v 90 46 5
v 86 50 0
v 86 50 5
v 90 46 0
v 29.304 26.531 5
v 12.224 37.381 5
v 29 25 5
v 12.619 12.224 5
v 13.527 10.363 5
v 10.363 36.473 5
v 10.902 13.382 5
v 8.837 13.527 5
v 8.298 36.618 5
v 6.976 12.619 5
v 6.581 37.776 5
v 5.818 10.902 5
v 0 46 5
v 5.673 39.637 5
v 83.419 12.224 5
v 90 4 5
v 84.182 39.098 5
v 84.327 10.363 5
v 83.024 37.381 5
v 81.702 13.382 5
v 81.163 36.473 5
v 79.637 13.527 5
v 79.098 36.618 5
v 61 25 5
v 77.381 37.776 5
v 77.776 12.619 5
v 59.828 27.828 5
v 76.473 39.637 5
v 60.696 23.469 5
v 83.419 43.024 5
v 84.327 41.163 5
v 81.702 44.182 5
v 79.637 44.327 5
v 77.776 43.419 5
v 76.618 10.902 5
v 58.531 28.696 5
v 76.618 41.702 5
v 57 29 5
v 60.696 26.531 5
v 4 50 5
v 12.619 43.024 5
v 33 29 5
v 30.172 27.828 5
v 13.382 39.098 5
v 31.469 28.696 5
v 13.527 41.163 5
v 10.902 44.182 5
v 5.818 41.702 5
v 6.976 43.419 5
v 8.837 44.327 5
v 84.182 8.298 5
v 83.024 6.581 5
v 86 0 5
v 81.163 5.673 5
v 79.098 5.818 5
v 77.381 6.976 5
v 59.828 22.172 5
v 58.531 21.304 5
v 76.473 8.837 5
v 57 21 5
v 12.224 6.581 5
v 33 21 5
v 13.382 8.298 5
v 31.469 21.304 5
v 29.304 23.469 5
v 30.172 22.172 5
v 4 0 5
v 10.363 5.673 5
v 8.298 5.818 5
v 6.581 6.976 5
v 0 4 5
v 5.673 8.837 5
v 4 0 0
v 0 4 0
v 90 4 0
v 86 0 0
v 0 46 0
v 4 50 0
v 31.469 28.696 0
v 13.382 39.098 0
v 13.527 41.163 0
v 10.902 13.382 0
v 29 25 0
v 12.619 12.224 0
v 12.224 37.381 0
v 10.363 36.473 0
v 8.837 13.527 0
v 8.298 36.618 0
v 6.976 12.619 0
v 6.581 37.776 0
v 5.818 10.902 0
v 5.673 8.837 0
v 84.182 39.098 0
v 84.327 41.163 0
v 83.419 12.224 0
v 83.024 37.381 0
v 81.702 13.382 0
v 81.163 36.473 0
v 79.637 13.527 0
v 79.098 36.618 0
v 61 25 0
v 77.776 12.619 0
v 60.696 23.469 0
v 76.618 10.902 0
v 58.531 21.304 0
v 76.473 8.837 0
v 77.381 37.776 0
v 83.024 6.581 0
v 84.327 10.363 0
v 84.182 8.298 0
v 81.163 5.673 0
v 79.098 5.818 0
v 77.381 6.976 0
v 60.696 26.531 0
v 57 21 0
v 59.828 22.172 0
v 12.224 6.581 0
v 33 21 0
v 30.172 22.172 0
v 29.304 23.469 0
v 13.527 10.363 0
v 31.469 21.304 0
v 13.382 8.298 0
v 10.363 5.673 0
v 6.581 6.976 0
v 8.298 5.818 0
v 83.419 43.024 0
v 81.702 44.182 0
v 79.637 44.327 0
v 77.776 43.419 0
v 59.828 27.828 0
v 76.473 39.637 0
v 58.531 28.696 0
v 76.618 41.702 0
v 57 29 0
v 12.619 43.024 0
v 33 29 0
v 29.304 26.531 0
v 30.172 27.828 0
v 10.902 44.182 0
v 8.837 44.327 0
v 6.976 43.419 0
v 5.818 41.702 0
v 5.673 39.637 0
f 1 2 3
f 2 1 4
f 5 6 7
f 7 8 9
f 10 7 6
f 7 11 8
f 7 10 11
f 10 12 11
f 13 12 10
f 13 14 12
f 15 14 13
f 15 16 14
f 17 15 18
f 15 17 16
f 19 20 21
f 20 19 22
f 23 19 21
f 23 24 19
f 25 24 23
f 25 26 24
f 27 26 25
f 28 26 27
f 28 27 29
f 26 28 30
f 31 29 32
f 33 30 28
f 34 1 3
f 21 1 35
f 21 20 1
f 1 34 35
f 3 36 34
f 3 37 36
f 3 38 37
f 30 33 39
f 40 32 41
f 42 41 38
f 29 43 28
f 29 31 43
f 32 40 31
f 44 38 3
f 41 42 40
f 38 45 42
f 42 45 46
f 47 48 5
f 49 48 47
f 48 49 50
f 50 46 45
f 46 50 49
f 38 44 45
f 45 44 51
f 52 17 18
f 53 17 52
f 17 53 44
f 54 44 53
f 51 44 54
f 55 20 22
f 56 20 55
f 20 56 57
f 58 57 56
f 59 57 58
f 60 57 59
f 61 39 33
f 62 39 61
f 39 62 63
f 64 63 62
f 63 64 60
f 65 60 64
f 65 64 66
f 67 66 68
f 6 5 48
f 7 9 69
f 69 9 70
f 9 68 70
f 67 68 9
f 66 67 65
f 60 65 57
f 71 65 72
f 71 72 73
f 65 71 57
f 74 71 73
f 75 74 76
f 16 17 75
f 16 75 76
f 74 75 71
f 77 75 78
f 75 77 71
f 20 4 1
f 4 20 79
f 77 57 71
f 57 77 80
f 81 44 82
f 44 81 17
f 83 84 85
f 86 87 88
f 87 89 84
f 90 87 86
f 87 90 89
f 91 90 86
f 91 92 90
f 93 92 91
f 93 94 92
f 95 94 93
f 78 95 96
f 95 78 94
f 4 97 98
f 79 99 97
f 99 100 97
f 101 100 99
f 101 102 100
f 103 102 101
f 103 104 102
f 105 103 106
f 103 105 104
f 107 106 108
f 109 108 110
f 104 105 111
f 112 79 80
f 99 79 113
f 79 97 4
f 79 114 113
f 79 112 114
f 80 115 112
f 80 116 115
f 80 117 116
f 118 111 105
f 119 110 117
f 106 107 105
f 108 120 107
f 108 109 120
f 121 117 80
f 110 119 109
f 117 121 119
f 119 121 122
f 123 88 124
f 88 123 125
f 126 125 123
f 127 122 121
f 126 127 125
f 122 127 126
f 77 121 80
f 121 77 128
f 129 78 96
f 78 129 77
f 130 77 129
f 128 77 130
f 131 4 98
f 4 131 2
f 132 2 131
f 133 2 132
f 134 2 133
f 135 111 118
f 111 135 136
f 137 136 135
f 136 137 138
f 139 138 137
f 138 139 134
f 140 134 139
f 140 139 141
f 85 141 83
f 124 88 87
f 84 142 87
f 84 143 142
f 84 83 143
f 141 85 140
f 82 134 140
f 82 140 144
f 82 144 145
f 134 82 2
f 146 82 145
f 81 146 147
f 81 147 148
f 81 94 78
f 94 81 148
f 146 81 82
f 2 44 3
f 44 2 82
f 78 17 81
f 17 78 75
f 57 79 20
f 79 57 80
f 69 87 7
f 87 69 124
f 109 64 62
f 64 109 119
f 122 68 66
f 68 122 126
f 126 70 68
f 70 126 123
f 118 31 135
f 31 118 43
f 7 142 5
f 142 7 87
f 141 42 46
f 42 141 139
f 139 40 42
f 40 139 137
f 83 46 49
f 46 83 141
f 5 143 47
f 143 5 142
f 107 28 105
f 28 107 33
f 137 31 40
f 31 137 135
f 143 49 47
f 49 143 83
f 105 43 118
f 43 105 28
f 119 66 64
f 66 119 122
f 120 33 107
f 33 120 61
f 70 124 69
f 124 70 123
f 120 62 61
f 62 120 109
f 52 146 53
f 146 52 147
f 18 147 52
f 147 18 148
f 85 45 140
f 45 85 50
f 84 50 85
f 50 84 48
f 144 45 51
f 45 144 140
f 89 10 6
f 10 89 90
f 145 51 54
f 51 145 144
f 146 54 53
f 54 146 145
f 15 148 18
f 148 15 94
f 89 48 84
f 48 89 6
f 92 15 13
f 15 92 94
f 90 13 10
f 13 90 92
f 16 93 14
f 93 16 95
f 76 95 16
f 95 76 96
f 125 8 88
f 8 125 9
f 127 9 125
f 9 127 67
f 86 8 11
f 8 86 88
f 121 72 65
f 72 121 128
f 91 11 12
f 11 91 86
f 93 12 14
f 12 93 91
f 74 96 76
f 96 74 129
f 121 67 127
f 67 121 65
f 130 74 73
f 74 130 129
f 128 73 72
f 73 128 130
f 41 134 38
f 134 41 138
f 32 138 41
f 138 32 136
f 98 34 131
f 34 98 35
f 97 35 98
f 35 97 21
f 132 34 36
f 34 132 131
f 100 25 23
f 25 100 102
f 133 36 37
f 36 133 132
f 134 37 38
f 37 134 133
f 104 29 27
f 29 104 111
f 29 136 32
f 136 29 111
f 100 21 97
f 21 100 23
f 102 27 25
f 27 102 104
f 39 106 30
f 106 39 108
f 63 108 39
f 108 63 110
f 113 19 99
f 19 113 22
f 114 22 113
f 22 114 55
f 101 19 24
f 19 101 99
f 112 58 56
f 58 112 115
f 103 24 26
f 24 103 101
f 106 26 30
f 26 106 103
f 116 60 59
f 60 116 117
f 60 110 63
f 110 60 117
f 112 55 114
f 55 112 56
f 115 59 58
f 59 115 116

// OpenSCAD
$fn = 32;

// ----------------------------------------------------------------------
// Bracket plate: slot plate 90 x 50
// ----------------------------------------------------------------------

// --- parameters (mm) ---
hole_r = 4;               // bolt hole radius
plate_t = 5;              // plate thickness, Z (extrusion height)
plate_l = 90;             // plate length
plate_w = 50;             // plate width
slot_l = 24;              // slot straight length
slot_r = 4;               // slot end radius

slot_len = slot_l + 2 * slot_r;
slot_w = 2 * slot_r;
hole_d2 = 2 * hole_r;

profile = [[4, 0], [86, 0], [90, 4], [90, 46], [86, 50], [4, 50], [0, 46], [0, 4]];  // primary outline, 8 points, counter clockwise
void_1 = [[57, 21], [58.531, 21.304], [59.828, 22.172], [60.696, 23.469], [61, 25], [60.696, 26.531], [59.828, 27.828], [58.531, 28.696], [57, 29], [33, 29], [31.469, 28.696], [30.172, 27.828], [29.304, 26.531], [29, 25], [29.304, 23.469], [30.172, 22.172], [31.469, 21.304], [33, 21]];  // grip slot, 18 points
void_2 = [[13.527, 41.163], [12.619, 43.024], [10.902, 44.182], [8.837, 44.327], [6.976, 43.419], [5.818, 41.702], [5.673, 39.637], [6.581, 37.776], [8.298, 36.618], [10.363, 36.473], [12.224, 37.381], [13.382, 39.098]];  // corner hole, 12 points
void_3 = [[13.527, 10.363], [12.619, 12.224], [10.902, 13.382], [8.837, 13.527], [6.976, 12.619], [5.818, 10.902], [5.673, 8.837], [6.581, 6.976], [8.298, 5.818], [10.363, 5.673], [12.224, 6.581], [13.382, 8.298]];  // corner hole, 12 points
void_4 = [[84.327, 41.163], [83.419, 43.024], [81.702, 44.182], [79.637, 44.327], [77.776, 43.419], [76.618, 41.702], [76.473, 39.637], [77.381, 37.776], [79.098, 36.618], [81.163, 36.473], [83.024, 37.381], [84.182, 39.098]];  // corner hole, 12 points
void_5 = [[84.327, 10.363], [83.419, 12.224], [81.702, 13.382], [79.637, 13.527], [77.776, 12.619], [76.618, 10.902], [76.473, 8.837], [77.381, 6.976], [79.098, 5.818], [81.163, 5.673], [83.024, 6.581], [84.182, 8.298]];  // corner hole, 12 points

// --- the one profile operation ---
difference() {
  linear_extrude(height = plate_t) polygon(points = profile);
  translate([0, 0, -1])
    linear_extrude(height = plate_t + 2) polygon(points = void_1);
  translate([0, 0, -1])
    linear_extrude(height = plate_t + 2) polygon(points = void_2);
  translate([0, 0, -1])
    linear_extrude(height = plate_t + 2) polygon(points = void_3);
  translate([0, 0, -1])
    linear_extrude(height = plate_t + 2) polygon(points = void_4);
  translate([0, 0, -1])
    linear_extrude(height = plate_t + 2) polygon(points = void_5);
}
